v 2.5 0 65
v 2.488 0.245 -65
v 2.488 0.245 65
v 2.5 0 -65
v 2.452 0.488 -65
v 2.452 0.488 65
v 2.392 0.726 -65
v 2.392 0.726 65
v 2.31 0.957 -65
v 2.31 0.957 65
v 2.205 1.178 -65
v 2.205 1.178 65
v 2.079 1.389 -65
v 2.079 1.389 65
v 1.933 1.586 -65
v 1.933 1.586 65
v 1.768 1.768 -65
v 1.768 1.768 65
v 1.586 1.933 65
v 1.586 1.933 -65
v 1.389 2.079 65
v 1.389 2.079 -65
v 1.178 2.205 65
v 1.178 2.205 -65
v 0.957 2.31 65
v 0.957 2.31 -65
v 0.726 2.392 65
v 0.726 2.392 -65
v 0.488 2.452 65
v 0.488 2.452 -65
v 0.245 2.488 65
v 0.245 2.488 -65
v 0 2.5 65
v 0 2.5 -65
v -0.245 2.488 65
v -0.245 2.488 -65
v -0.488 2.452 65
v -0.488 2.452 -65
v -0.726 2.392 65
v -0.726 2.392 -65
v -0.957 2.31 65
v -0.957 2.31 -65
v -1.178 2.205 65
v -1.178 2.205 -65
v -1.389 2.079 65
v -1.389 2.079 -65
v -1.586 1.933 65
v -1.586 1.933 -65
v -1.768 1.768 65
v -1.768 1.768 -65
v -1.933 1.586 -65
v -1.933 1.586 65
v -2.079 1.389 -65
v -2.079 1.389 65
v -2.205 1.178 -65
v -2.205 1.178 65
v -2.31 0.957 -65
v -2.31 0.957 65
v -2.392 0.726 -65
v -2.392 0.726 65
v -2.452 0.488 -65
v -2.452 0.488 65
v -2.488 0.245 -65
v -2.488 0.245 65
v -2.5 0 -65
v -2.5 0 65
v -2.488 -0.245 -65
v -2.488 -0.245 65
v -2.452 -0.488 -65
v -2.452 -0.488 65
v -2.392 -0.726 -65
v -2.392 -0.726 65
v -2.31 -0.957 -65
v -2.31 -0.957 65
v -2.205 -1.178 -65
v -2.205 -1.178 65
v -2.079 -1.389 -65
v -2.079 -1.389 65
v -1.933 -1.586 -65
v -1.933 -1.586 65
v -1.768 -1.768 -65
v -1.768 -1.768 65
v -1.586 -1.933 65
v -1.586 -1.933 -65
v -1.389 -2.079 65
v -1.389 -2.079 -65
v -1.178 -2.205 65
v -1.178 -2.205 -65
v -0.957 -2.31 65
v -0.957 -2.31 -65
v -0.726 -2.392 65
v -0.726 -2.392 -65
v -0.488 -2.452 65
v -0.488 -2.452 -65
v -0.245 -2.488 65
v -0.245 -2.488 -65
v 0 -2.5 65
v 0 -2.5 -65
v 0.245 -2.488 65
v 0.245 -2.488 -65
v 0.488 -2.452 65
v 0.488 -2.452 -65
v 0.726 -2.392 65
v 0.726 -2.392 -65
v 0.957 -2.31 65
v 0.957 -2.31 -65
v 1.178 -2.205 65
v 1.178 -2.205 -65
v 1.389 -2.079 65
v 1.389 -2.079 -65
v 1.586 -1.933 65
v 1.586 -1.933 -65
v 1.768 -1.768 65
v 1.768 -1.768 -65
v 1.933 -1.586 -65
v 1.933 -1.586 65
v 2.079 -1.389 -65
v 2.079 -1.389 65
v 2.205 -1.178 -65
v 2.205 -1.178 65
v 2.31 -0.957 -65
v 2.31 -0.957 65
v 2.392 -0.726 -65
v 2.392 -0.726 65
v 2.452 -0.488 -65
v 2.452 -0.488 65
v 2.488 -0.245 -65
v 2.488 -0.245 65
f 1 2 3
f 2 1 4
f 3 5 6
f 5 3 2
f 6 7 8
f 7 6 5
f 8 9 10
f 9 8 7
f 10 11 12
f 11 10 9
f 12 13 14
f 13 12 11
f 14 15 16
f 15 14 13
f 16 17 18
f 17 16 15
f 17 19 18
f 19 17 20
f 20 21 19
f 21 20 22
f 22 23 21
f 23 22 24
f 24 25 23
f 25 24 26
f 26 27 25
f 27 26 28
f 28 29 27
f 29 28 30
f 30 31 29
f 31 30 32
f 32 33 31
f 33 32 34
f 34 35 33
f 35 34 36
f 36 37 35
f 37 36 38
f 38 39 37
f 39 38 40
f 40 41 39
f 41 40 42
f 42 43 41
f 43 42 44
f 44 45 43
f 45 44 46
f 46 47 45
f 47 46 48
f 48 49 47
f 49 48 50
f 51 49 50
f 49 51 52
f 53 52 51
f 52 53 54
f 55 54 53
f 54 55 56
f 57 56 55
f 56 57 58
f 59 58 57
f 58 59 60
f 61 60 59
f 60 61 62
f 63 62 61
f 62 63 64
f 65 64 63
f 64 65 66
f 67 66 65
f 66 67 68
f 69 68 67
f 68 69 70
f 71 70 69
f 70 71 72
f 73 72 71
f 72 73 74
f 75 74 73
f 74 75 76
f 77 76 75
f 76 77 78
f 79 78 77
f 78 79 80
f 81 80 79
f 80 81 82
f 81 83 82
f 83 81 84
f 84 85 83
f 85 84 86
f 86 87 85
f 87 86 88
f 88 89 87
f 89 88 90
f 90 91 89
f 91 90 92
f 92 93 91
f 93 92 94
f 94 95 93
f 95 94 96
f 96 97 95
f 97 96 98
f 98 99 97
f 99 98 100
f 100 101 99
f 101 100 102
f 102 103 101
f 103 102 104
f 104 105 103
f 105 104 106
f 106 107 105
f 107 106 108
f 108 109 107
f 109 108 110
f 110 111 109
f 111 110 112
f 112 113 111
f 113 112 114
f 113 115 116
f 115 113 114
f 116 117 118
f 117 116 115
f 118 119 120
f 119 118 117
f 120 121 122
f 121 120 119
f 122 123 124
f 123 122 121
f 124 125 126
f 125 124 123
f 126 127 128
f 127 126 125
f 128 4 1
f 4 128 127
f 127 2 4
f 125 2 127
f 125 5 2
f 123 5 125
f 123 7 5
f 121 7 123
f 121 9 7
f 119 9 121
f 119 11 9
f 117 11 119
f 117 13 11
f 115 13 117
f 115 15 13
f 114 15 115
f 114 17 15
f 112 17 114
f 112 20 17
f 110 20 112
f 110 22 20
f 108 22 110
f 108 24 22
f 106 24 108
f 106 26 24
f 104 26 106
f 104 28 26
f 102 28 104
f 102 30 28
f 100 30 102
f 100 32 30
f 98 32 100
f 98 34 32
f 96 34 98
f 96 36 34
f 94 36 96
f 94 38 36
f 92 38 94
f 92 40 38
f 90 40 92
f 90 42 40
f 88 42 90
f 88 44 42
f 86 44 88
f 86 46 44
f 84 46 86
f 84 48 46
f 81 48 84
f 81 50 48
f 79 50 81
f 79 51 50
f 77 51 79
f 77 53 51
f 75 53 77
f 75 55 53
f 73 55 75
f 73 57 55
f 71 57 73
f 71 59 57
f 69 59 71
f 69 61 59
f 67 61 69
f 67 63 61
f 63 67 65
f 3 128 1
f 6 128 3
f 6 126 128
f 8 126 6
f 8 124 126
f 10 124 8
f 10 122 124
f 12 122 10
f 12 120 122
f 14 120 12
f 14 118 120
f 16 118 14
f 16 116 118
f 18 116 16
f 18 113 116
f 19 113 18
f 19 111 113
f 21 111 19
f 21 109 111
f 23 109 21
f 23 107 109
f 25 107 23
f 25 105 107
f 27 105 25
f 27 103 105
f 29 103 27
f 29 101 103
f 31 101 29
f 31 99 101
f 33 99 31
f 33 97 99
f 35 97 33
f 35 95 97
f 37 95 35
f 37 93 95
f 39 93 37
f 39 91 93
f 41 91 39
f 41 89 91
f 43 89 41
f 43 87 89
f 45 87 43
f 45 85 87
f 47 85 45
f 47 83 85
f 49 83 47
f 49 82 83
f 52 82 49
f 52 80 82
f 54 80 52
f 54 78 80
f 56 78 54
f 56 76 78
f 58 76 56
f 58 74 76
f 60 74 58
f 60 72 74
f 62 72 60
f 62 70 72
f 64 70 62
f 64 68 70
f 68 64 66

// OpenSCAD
$fn = 64;
length = 130;
dia = 5.0;

cylinder(h=length, r=dia/2, center=true);
